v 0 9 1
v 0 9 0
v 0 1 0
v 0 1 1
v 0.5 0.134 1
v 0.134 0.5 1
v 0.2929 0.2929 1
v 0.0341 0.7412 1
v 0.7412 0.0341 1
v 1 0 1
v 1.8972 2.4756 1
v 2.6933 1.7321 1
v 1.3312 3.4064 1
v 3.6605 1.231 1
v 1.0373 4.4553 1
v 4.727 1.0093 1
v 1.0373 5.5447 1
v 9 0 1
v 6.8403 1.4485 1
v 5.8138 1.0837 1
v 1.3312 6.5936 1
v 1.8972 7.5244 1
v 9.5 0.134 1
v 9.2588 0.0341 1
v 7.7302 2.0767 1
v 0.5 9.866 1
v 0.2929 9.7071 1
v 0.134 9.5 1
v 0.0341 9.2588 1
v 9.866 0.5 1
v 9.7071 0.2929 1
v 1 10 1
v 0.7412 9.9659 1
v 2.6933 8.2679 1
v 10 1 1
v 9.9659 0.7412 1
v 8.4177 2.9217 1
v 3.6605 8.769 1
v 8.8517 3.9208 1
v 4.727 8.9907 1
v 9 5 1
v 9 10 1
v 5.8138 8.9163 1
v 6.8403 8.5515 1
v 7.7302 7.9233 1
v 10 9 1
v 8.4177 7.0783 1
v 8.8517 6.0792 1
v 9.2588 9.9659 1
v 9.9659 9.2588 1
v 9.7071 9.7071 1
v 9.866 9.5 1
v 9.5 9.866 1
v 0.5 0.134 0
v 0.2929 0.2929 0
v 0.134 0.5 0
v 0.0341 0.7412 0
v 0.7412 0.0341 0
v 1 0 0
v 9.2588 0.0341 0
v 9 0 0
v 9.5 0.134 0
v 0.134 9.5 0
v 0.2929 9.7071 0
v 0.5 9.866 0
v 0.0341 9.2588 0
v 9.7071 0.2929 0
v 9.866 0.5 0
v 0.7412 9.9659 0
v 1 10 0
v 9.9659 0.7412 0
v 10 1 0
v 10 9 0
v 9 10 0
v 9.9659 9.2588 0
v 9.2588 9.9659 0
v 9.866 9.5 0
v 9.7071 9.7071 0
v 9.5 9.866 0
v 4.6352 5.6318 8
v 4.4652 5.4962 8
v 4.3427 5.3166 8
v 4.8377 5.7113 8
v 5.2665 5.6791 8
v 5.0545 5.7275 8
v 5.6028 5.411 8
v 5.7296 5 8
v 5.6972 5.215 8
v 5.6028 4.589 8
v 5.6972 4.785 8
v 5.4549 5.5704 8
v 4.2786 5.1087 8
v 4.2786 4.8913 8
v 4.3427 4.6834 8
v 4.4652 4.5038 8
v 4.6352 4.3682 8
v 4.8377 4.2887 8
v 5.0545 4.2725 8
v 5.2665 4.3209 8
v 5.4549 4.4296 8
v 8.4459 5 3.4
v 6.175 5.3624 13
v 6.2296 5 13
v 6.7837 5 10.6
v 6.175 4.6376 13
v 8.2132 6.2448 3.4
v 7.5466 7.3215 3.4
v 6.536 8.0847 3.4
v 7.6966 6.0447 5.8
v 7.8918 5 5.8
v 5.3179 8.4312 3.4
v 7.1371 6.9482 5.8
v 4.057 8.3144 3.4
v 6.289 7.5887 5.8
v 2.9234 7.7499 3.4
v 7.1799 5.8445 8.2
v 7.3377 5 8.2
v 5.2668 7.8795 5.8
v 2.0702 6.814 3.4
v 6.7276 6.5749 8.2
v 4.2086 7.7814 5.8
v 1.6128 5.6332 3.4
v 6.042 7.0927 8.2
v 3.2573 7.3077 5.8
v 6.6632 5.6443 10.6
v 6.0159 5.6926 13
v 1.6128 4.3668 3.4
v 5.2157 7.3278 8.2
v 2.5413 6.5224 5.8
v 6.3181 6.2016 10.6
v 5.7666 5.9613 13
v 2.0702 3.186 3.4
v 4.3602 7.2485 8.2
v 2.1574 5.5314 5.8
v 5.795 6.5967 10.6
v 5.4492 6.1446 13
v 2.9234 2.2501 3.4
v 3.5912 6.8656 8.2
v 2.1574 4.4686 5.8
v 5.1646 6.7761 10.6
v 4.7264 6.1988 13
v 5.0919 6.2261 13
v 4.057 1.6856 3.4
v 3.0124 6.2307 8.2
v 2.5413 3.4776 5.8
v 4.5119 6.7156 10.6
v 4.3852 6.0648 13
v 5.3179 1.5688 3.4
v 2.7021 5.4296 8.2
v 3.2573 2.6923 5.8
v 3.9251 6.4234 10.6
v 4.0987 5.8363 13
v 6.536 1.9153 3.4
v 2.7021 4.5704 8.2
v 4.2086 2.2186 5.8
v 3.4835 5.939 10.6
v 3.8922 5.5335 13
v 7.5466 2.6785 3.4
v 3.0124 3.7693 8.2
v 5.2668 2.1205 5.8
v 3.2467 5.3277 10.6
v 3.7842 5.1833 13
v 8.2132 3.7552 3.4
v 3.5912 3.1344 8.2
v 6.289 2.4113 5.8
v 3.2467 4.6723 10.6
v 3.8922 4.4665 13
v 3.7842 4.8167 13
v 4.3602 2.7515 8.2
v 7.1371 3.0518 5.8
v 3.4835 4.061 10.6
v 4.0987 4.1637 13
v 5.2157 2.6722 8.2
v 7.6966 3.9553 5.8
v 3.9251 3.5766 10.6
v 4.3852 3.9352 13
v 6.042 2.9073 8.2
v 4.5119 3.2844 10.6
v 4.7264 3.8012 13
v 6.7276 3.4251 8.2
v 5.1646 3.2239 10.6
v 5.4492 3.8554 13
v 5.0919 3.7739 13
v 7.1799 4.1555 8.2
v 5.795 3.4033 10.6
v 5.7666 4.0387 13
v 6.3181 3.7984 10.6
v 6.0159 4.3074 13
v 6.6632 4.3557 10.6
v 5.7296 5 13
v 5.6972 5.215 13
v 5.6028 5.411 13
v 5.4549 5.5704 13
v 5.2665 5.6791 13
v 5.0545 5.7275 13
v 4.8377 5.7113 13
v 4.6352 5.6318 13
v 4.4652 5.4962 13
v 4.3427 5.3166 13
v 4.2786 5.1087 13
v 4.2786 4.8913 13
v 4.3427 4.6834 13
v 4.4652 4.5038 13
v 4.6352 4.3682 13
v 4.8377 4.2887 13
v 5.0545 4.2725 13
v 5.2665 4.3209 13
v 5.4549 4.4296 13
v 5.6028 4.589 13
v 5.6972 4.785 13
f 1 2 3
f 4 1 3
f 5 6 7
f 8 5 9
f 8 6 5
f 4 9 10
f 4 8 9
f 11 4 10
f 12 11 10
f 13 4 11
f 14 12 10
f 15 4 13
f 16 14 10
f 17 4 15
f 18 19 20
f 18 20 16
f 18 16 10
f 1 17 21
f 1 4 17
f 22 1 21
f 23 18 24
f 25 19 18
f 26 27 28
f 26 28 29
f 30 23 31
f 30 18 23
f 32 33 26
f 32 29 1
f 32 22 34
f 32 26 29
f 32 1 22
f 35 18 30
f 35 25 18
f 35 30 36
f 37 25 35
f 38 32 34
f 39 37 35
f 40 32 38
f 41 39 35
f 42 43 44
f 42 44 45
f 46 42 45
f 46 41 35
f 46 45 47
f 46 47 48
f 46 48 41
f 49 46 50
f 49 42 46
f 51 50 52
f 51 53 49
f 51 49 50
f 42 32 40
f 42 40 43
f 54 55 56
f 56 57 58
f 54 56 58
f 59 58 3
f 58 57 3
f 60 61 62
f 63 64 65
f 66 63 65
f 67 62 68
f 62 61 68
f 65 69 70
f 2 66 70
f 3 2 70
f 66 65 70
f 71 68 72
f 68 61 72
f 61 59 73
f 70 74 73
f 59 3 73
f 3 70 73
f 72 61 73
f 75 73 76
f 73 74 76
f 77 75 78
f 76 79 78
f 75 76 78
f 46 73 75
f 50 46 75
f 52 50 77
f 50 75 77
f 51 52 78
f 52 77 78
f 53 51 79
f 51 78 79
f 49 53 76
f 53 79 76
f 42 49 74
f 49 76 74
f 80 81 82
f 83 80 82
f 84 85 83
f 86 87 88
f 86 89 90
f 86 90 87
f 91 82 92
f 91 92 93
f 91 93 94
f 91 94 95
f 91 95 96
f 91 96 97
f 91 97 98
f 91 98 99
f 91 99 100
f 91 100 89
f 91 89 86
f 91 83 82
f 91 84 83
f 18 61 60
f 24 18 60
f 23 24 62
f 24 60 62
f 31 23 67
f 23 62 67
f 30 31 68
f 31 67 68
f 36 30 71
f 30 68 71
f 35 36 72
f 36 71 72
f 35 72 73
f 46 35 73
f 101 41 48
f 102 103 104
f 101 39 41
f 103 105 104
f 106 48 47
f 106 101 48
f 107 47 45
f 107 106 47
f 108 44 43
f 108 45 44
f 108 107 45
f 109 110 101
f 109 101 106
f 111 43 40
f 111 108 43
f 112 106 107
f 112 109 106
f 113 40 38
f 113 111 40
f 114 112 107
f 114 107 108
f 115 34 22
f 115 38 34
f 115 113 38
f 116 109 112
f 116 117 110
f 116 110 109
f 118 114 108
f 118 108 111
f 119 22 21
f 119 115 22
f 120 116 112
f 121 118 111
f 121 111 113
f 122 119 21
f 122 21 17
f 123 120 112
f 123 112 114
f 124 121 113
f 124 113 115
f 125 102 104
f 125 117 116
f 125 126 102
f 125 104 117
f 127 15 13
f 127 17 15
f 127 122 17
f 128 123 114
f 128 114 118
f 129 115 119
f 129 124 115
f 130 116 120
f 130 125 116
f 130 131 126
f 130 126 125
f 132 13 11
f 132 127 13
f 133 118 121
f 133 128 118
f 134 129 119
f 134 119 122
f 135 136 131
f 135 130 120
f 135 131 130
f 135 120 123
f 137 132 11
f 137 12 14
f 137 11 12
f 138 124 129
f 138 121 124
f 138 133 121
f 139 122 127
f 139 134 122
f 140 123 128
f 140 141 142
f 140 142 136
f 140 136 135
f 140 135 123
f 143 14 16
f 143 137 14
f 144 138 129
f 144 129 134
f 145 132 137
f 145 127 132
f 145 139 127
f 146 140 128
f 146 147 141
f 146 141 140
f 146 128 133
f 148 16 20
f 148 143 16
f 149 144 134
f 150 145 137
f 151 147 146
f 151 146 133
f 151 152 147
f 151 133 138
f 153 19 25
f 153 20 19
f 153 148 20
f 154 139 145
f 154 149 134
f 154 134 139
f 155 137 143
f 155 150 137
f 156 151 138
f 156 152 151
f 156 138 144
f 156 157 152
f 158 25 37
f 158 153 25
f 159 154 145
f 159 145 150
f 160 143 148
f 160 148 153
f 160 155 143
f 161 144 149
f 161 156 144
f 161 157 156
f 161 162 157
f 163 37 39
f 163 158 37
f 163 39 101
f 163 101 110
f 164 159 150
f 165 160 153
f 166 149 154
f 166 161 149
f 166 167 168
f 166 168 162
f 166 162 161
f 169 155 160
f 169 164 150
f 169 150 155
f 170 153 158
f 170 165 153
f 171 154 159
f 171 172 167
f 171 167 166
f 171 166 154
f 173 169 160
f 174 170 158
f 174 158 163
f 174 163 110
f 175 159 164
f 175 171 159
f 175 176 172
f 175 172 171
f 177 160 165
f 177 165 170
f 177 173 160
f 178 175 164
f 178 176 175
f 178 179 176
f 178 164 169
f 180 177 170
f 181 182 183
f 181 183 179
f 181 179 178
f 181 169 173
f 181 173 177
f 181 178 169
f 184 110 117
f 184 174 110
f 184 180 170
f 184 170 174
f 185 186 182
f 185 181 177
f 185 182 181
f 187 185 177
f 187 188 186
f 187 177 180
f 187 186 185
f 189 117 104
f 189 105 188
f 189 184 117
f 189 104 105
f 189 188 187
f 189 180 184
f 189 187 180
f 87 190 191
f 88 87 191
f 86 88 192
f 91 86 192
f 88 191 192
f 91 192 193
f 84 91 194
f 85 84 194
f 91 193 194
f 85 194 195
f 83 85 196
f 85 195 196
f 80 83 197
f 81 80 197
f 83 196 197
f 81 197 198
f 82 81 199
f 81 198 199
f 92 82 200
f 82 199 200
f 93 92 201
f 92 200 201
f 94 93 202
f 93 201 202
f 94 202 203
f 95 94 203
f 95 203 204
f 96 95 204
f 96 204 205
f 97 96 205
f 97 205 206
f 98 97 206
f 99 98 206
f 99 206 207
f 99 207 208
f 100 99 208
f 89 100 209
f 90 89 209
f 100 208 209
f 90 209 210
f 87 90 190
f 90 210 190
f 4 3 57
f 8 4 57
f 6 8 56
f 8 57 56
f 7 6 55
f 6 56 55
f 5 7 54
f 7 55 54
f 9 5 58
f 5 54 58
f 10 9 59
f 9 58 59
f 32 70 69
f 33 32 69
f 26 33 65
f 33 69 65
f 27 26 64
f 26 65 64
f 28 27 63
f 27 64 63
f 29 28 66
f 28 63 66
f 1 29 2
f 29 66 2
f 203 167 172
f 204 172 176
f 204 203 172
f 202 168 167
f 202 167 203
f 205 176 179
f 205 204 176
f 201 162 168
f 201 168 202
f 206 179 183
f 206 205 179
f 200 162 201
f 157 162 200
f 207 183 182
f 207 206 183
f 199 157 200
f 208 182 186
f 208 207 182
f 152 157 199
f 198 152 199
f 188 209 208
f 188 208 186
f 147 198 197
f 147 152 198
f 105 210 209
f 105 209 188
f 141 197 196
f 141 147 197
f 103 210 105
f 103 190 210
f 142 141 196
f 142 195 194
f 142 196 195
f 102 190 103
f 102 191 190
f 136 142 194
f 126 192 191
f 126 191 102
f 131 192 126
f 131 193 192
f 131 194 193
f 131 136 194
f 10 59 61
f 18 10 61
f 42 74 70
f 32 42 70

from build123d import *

# Parameters (mm, degrees)
F1_DEPTH = 1
F2_R     = 4
F3_DEPTH = 12
F3_TAPER = 13
F4_R     = 0.7295817065
F5_DEPTH = 5


with BuildPart() as f1:
    # F0 (on Top) → F1 (new body)
    with BuildSketch(Plane.XY):
        with BuildLine():
            ThreePointArc((0, 1), (0.2928932188, 0.2928932188), (1, 0))
            Line((1, 0), (9, 0))
            ThreePointArc((9, 0), (9.7071067812, 0.2928932188), (10, 1))
            Line((10, 1), (10, 9))
            ThreePointArc((10, 9), (9.7071067812, 9.7071067812), (9, 10))
            Line((9, 10), (1, 10))
            ThreePointArc((1, 10), (0.2928932188, 9.7071067812), (0, 9))
            Line((0, 9), (0, 1))
        make_face()
    extrude(amount=F1_DEPTH)

    # F2 (on face) → F3 (join)
    with BuildSketch(Plane.XY.offset(1)):
        with Locations((5, 5)):
            Circle(F2_R)
    extrude(amount=F3_DEPTH, taper=F3_TAPER)

    # F4 (on face) → F5 (cut)
    with BuildSketch(Plane.XY.offset(13)):
        with Locations((5, 5)):
            Circle(F4_R)
    extrude(amount=-F5_DEPTH, mode=Mode.SUBTRACT)


solid = f1.part
